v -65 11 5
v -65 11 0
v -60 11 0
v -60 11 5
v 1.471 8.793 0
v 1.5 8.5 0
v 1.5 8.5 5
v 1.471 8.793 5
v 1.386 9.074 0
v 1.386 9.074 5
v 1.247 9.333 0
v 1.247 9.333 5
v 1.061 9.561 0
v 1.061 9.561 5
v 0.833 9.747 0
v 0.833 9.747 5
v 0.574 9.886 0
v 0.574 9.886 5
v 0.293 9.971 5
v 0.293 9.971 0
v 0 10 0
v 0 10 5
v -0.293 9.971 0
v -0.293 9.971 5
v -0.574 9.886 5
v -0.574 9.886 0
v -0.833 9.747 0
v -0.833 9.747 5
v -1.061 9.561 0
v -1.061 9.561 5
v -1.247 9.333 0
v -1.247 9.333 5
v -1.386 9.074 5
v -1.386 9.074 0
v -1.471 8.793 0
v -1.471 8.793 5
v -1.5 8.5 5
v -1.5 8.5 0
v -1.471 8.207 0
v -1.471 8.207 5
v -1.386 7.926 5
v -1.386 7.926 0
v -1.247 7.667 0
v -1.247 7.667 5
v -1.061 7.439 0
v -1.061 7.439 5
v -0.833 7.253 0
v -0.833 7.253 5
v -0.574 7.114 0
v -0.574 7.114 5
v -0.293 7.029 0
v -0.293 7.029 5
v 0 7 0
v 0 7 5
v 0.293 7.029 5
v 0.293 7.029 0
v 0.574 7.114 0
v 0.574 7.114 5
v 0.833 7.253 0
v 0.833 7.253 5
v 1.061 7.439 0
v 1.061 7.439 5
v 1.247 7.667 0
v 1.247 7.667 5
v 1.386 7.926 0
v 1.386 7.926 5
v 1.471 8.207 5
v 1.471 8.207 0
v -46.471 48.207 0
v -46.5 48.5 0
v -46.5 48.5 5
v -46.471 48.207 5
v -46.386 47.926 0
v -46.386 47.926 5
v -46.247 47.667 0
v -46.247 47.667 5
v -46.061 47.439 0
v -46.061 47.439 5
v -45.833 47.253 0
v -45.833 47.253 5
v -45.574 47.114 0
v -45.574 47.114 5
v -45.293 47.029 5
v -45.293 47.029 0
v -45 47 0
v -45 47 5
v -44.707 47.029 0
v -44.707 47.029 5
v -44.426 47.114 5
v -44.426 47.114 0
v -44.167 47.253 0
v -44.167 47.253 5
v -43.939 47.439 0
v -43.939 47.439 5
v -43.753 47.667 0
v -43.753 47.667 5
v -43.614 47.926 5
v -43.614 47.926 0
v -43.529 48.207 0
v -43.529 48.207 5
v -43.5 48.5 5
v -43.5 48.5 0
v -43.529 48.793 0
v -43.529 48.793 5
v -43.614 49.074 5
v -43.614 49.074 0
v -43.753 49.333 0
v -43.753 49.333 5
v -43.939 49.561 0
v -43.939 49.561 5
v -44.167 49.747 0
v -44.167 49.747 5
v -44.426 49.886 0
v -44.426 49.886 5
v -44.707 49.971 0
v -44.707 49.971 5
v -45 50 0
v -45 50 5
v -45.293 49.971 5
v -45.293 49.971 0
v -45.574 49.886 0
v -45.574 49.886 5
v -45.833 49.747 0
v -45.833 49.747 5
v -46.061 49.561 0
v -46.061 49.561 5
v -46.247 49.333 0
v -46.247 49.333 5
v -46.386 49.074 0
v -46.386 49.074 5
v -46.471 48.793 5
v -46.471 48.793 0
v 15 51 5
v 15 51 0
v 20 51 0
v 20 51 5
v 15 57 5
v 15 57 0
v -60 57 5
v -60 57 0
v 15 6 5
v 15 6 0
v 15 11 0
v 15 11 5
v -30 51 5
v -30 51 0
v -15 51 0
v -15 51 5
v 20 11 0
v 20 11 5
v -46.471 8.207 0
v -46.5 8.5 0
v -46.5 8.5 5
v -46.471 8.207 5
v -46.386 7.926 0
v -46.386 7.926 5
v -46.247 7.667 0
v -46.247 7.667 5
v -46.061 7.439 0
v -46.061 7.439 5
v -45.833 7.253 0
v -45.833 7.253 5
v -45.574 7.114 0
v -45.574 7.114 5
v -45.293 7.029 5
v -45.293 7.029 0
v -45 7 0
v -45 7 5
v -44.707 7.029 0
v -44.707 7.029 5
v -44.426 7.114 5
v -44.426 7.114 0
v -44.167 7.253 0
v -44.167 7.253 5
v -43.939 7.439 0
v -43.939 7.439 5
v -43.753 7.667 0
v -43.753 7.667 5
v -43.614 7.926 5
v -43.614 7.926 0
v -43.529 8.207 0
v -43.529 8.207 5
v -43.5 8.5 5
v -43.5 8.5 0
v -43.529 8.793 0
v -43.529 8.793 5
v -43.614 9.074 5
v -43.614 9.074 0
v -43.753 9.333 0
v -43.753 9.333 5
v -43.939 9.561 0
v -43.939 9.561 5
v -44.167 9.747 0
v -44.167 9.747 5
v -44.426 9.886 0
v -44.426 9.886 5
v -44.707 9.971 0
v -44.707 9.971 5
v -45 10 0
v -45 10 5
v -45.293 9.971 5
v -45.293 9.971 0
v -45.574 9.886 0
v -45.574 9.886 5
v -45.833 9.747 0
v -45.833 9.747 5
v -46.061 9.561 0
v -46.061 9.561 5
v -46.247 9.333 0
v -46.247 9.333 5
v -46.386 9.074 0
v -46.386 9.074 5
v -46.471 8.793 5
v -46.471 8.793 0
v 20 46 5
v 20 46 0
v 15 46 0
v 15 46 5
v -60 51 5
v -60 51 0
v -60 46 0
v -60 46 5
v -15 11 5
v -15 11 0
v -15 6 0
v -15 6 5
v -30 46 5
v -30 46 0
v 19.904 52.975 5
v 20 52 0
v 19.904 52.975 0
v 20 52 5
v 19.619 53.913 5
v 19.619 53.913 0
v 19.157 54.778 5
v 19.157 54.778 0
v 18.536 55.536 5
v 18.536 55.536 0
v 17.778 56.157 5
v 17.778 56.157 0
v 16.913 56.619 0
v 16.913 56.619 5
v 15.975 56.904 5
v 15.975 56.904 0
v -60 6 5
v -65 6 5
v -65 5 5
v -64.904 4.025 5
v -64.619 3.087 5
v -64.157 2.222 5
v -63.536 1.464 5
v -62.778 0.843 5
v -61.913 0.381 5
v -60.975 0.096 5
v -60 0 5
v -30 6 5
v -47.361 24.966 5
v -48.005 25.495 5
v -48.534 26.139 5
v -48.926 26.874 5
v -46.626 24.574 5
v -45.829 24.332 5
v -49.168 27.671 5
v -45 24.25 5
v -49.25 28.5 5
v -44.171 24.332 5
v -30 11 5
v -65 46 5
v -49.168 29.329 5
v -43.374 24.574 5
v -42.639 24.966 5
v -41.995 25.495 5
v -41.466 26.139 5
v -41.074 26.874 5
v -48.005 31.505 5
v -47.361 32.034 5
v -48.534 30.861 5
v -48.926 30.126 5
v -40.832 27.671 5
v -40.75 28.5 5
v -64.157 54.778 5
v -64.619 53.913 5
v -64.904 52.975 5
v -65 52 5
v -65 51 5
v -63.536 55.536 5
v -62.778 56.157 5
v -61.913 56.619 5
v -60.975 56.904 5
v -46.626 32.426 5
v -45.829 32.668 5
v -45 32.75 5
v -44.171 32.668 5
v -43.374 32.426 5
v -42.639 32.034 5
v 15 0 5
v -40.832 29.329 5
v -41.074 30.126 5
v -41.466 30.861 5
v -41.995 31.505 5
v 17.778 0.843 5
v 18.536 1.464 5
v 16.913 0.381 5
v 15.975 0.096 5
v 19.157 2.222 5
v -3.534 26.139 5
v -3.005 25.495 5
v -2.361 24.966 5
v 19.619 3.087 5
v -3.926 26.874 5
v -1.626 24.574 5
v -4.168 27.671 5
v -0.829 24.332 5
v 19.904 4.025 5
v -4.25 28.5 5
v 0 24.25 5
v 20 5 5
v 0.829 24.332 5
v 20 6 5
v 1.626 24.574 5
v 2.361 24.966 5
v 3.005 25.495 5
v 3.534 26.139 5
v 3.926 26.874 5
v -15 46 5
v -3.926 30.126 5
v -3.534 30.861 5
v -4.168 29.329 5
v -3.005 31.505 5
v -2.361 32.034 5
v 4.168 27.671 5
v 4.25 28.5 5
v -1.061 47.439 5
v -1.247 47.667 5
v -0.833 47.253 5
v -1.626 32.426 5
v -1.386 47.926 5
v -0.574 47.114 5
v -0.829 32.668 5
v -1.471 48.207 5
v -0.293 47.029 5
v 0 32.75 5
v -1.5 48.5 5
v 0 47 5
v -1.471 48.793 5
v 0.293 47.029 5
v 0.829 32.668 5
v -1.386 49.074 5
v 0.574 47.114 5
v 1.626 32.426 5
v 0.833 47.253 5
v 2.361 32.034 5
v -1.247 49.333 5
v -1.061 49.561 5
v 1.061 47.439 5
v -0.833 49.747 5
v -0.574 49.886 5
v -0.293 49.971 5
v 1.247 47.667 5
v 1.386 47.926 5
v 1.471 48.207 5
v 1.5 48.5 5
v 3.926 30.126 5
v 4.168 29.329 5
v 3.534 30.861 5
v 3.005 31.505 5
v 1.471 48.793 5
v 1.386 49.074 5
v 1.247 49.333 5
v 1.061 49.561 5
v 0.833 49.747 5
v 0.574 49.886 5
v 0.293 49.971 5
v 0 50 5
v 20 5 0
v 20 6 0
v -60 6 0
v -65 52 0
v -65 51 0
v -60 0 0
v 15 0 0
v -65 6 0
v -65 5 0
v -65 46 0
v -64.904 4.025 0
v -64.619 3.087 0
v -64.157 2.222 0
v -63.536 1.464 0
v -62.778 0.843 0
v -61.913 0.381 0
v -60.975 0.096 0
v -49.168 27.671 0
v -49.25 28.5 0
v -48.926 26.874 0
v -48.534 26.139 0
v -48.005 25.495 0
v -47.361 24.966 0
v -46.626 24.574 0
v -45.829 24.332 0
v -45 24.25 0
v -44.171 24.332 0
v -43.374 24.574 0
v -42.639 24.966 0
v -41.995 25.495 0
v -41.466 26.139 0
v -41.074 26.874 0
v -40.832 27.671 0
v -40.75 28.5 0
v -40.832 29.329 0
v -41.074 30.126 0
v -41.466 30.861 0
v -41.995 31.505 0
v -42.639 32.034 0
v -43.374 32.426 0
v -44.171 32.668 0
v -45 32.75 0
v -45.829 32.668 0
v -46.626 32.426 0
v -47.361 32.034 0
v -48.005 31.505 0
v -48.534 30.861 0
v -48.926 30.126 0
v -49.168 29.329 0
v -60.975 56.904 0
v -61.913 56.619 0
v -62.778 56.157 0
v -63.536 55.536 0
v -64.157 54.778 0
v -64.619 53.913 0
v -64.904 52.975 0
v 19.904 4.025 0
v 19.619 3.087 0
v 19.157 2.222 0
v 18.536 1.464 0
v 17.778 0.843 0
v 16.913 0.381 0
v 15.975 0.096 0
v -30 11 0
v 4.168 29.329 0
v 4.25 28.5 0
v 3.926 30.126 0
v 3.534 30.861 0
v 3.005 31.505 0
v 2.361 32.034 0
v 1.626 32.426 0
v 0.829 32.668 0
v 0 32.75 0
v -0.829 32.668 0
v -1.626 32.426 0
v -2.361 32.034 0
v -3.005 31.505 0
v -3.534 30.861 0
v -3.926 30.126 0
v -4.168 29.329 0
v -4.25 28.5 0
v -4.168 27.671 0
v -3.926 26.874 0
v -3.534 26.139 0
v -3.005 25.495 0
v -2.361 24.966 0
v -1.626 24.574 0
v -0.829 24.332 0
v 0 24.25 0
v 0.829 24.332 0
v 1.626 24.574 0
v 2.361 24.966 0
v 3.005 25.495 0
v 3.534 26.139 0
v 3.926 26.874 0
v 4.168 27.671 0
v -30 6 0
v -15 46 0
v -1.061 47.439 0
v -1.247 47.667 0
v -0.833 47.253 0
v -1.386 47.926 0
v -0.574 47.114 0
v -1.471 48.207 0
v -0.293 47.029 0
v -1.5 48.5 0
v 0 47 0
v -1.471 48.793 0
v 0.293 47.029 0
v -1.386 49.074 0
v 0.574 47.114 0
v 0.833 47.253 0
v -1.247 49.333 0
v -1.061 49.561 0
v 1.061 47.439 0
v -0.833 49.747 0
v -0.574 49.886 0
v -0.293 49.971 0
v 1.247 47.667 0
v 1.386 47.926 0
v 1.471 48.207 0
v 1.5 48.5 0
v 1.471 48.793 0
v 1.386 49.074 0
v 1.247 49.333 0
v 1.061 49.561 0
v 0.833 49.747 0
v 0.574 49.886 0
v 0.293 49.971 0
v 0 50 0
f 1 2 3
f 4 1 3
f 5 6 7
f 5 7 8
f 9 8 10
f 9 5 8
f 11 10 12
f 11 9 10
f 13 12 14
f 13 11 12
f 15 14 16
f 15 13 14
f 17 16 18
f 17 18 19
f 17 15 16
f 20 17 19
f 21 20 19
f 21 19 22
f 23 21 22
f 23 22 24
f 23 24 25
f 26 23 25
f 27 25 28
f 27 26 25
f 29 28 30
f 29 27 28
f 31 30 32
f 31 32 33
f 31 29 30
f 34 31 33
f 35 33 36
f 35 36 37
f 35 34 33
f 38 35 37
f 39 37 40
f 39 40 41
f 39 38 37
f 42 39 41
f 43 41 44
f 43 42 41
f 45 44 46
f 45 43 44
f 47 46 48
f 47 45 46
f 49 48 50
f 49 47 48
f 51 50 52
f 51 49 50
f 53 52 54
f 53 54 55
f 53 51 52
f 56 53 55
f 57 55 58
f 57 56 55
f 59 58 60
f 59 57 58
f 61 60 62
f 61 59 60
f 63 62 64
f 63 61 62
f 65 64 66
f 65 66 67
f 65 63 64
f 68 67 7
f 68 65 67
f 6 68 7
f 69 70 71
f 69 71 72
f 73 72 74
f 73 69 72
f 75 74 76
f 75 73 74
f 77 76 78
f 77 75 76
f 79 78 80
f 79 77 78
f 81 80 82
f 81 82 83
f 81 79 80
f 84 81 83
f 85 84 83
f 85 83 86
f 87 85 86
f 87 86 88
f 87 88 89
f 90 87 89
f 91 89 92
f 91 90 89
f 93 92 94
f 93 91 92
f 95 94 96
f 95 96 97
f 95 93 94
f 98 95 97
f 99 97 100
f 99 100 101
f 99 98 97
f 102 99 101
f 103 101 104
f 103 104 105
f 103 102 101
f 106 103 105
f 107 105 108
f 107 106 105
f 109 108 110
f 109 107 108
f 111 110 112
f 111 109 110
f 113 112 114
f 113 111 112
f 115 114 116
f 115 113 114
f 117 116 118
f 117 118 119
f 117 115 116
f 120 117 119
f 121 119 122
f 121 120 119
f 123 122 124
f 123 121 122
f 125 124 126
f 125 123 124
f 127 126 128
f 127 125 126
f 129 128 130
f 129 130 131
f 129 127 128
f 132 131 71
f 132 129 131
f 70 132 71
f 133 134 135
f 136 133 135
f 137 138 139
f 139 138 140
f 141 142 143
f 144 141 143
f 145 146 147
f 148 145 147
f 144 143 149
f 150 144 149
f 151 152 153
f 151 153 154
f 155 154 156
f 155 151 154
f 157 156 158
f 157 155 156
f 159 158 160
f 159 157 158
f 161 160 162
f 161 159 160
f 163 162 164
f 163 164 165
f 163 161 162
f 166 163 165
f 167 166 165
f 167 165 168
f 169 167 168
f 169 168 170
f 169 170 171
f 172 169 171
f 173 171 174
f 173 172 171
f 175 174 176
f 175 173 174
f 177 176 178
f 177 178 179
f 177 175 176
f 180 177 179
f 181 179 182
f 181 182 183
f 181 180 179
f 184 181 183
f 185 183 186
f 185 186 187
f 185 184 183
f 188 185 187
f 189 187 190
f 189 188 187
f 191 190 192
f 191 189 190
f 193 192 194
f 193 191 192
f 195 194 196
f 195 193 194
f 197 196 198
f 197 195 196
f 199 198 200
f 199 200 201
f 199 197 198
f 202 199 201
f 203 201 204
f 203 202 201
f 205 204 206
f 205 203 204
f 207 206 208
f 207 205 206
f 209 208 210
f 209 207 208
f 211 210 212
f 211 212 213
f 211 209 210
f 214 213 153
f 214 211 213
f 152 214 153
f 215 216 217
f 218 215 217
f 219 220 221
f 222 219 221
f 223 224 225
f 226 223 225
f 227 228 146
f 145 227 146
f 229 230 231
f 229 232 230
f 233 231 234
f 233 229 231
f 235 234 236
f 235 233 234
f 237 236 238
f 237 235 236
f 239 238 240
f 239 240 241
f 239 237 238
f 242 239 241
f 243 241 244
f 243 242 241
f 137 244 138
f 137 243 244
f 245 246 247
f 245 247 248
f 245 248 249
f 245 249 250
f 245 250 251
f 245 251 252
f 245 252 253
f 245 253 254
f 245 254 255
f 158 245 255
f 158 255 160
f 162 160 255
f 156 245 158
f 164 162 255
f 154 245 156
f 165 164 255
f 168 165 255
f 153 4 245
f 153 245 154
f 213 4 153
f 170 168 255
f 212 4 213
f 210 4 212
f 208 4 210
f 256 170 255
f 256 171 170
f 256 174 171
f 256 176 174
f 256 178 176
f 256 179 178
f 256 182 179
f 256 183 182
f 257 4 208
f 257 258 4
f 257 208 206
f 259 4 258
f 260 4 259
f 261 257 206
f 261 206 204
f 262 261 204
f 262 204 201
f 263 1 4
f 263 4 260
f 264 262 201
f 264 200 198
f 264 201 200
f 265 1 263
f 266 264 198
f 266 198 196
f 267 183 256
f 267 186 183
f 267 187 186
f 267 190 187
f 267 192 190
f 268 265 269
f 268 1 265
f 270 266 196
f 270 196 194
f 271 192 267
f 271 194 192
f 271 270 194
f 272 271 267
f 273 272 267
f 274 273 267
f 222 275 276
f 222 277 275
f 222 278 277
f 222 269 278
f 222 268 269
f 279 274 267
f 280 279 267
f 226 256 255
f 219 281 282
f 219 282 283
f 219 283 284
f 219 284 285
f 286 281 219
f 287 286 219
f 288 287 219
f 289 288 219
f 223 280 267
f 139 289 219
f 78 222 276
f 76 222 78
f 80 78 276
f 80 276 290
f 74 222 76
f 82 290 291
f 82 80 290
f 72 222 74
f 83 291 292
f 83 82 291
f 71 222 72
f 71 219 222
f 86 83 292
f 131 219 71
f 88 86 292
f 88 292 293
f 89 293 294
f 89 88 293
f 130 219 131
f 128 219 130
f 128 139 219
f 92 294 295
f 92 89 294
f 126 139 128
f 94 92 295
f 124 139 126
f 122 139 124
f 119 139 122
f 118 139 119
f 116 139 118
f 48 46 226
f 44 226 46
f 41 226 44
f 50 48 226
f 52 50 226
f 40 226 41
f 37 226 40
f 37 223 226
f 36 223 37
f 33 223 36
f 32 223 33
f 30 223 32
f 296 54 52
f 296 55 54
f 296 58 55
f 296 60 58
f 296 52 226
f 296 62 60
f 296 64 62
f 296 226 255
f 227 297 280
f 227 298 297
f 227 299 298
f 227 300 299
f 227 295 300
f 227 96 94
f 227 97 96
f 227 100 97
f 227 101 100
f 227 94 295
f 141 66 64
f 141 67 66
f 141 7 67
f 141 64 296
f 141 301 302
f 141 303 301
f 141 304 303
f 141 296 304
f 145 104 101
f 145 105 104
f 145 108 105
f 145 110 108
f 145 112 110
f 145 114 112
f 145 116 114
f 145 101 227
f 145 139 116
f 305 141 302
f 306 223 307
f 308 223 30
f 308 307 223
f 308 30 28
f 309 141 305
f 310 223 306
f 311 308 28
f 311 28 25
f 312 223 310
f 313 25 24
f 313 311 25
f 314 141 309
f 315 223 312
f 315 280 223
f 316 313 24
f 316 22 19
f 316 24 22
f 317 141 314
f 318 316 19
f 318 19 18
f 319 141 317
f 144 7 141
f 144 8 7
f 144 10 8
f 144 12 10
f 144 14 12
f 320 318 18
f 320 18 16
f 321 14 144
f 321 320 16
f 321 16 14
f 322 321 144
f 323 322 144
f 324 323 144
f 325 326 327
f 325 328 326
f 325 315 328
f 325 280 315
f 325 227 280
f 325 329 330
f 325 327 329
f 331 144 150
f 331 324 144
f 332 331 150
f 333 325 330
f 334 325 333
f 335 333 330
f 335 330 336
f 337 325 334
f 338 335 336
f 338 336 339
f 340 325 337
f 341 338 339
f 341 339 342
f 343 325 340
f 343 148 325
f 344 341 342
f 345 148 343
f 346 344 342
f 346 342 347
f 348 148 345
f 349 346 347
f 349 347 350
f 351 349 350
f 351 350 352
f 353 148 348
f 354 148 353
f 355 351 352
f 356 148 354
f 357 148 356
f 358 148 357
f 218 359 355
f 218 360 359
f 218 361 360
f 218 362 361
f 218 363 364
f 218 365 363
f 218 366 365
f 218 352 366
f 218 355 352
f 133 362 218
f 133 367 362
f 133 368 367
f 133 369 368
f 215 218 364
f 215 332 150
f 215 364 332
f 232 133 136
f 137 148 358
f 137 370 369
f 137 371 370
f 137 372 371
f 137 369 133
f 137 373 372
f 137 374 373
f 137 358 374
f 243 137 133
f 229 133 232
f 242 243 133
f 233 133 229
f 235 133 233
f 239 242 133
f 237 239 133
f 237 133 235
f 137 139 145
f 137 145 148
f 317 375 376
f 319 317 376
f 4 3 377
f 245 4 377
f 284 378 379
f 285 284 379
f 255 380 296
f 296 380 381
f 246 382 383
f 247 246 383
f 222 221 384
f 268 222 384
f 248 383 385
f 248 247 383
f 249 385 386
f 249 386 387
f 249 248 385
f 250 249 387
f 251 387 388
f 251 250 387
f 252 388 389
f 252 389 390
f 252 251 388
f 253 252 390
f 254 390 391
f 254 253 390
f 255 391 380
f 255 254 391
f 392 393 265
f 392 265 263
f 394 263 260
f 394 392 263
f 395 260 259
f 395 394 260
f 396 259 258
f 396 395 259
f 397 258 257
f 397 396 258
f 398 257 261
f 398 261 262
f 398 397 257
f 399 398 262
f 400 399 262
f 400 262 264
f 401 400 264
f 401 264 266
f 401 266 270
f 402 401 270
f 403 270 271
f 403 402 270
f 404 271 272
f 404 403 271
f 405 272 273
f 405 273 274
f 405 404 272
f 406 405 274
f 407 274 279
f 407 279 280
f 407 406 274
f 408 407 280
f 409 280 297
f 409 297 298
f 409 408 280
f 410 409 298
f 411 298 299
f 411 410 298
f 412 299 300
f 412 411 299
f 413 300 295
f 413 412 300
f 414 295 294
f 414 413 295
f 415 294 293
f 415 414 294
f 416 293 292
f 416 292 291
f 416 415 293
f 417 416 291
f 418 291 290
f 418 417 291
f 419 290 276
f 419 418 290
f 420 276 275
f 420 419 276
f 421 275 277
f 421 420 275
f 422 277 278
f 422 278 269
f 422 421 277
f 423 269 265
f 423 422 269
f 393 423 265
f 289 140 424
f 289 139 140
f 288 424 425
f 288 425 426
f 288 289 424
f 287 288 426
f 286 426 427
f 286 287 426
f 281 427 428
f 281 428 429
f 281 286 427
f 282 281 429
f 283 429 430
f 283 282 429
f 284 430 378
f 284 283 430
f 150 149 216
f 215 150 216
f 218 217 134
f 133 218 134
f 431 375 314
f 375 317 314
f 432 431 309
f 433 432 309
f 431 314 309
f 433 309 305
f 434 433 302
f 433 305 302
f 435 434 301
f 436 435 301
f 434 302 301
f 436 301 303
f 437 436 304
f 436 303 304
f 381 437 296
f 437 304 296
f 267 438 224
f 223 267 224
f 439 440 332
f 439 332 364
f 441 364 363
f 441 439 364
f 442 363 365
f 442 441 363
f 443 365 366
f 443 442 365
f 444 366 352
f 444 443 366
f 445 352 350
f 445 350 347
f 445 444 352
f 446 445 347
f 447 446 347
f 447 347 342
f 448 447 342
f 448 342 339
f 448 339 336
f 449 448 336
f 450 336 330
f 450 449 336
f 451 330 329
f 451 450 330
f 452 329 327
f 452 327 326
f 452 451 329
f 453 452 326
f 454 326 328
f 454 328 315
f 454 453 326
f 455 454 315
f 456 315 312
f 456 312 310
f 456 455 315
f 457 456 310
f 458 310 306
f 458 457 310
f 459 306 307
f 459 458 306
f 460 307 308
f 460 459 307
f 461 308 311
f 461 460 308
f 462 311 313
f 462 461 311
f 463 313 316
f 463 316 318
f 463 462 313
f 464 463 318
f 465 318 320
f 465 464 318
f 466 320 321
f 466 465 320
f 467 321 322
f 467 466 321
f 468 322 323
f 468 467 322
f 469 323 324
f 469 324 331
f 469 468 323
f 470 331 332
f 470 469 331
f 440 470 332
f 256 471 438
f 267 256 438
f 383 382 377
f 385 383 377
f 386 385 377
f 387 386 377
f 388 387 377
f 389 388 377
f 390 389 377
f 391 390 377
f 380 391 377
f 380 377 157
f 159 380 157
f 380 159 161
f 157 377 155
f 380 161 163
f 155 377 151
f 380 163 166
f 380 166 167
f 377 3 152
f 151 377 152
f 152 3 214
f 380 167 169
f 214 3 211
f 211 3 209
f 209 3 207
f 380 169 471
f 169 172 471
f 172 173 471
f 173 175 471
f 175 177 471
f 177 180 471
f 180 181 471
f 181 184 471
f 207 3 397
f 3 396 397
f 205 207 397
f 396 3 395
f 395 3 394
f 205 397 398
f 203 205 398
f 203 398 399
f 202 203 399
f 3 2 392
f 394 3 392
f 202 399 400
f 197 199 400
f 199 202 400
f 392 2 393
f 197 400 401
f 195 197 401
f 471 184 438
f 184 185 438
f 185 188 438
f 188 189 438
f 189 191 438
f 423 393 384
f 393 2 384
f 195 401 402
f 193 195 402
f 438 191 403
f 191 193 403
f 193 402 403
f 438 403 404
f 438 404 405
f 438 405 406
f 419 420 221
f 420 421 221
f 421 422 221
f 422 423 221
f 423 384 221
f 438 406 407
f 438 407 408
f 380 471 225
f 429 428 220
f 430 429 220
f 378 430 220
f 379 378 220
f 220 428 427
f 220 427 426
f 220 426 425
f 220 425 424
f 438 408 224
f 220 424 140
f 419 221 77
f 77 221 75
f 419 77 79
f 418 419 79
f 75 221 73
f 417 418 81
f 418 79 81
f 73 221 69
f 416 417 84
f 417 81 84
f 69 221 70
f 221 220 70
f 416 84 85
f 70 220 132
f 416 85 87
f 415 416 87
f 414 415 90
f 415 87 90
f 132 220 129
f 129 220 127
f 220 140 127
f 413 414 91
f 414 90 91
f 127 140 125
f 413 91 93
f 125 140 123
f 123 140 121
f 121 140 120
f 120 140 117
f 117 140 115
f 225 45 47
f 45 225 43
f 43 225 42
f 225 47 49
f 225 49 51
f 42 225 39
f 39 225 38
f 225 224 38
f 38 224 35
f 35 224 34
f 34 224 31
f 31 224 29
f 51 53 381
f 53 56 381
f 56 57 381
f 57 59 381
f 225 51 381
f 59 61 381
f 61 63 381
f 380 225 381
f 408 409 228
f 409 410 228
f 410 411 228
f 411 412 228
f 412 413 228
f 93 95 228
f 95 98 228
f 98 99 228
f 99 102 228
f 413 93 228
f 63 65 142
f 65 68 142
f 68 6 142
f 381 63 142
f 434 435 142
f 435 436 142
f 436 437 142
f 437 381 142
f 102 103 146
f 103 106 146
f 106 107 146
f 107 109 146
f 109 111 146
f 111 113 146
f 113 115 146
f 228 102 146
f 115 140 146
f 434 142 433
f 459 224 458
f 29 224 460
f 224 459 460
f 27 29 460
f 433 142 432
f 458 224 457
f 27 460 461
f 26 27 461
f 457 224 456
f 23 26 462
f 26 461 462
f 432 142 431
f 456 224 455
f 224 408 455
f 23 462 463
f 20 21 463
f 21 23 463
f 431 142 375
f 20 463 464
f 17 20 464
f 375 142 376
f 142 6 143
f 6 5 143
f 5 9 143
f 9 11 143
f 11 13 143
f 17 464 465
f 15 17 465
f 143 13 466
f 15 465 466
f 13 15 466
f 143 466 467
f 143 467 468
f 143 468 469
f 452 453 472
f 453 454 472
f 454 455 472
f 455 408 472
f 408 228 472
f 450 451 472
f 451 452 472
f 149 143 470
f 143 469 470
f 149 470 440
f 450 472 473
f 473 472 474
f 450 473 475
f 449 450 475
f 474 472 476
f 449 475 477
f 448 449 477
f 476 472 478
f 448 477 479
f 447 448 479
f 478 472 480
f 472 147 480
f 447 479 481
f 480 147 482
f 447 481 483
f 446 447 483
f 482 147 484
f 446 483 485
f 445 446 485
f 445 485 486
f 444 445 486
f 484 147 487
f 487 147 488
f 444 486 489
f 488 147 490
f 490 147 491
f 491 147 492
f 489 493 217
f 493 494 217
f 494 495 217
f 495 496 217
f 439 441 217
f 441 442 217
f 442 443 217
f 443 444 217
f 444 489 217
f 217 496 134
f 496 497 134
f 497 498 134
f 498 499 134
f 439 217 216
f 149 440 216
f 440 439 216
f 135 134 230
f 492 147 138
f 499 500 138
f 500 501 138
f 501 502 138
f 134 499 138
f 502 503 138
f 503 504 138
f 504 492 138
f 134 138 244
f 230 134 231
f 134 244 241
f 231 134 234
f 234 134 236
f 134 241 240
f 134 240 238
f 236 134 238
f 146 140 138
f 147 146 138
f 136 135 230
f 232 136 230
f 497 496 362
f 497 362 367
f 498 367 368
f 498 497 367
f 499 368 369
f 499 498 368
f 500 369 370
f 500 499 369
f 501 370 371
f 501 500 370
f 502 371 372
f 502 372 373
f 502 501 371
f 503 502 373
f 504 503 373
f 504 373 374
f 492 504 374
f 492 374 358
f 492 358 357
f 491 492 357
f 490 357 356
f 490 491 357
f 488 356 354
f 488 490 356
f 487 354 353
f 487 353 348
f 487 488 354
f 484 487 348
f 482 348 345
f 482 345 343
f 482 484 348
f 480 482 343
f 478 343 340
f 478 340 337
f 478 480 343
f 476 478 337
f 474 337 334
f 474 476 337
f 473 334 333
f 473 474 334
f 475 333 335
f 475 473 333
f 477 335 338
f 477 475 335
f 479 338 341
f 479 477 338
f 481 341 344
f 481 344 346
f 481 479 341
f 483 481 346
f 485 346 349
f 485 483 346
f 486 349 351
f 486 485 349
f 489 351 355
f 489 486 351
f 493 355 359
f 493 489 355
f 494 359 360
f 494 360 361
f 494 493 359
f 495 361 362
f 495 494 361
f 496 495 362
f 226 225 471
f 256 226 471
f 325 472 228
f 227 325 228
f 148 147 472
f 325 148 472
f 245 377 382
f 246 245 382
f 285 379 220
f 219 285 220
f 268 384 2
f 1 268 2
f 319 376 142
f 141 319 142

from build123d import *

# Parameters (mm, degrees)
ESQUISSE1_R        = 1.5
ESQUISSE1_R_2      = 4.25
BOSS_EXTRU_1_DEPTH = 5
CONG_1_R           = 5


with BuildPart() as part:
    # Esquisse1 → Boss.-Extru.1 (new body)
    with BuildSketch(Plane.XY):
        Polygon((-20, 0), (20, 0), (20, 6), (15, 6), (15, 11), (20, 11), (20, 46), (15, 46), (15, 51), (20, 51), (20, 57), (-20, 57), (-25, 57), (-65, 57), (-65, 51), (-60, 51), (-60, 46), (-65, 46), (-65, 11), (-60, 11), (-60, 6), (-65, 6), (-65, 0), (-25, 0), align=None)
        with Locations((0, 48.5)):
            Circle(ESQUISSE1_R, mode=Mode.SUBTRACT)
        with Locations((0, 8.5)):
            Circle(ESQUISSE1_R, mode=Mode.SUBTRACT)
        with Locations((0, 28.5)):
            Circle(ESQUISSE1_R_2, mode=Mode.SUBTRACT)
        with Locations(Location((-45, 8.5, 0), (0, 0, 180))):
            Circle(ESQUISSE1_R, mode=Mode.SUBTRACT)
        with Locations(Location((-45, 28.5, 0), (0, 0, 180))):
            Circle(ESQUISSE1_R_2, mode=Mode.SUBTRACT)
        with Locations(Location((-45, 48.5, 0), (0, 0, 180))):
            Circle(ESQUISSE1_R, mode=Mode.SUBTRACT)
        Polygon((-20, 51), (-15, 51), (-15, 46), (-20, 46), (-25, 46), (-30, 46), (-30, 51), (-25, 51), align=None, mode=Mode.SUBTRACT)
        Polygon((-20, 11), (-15, 11), (-15, 6), (-20, 6), (-25, 6), (-30, 6), (-30, 11), (-25, 11), align=None, mode=Mode.SUBTRACT)
    extrude(amount=BOSS_EXTRU_1_DEPTH)

    # Congé1
    cong_1_edges = [part.edges().sort_by_distance(p)[0] for p in [
        (-65, 0, 2.5),
        (-65, 57, 2.5),
        (20, 57, 2.5),
        (20, 0, 2.5),
    ]]
    fillet(cong_1_edges, radius=CONG_1_R)


solid = part.part
